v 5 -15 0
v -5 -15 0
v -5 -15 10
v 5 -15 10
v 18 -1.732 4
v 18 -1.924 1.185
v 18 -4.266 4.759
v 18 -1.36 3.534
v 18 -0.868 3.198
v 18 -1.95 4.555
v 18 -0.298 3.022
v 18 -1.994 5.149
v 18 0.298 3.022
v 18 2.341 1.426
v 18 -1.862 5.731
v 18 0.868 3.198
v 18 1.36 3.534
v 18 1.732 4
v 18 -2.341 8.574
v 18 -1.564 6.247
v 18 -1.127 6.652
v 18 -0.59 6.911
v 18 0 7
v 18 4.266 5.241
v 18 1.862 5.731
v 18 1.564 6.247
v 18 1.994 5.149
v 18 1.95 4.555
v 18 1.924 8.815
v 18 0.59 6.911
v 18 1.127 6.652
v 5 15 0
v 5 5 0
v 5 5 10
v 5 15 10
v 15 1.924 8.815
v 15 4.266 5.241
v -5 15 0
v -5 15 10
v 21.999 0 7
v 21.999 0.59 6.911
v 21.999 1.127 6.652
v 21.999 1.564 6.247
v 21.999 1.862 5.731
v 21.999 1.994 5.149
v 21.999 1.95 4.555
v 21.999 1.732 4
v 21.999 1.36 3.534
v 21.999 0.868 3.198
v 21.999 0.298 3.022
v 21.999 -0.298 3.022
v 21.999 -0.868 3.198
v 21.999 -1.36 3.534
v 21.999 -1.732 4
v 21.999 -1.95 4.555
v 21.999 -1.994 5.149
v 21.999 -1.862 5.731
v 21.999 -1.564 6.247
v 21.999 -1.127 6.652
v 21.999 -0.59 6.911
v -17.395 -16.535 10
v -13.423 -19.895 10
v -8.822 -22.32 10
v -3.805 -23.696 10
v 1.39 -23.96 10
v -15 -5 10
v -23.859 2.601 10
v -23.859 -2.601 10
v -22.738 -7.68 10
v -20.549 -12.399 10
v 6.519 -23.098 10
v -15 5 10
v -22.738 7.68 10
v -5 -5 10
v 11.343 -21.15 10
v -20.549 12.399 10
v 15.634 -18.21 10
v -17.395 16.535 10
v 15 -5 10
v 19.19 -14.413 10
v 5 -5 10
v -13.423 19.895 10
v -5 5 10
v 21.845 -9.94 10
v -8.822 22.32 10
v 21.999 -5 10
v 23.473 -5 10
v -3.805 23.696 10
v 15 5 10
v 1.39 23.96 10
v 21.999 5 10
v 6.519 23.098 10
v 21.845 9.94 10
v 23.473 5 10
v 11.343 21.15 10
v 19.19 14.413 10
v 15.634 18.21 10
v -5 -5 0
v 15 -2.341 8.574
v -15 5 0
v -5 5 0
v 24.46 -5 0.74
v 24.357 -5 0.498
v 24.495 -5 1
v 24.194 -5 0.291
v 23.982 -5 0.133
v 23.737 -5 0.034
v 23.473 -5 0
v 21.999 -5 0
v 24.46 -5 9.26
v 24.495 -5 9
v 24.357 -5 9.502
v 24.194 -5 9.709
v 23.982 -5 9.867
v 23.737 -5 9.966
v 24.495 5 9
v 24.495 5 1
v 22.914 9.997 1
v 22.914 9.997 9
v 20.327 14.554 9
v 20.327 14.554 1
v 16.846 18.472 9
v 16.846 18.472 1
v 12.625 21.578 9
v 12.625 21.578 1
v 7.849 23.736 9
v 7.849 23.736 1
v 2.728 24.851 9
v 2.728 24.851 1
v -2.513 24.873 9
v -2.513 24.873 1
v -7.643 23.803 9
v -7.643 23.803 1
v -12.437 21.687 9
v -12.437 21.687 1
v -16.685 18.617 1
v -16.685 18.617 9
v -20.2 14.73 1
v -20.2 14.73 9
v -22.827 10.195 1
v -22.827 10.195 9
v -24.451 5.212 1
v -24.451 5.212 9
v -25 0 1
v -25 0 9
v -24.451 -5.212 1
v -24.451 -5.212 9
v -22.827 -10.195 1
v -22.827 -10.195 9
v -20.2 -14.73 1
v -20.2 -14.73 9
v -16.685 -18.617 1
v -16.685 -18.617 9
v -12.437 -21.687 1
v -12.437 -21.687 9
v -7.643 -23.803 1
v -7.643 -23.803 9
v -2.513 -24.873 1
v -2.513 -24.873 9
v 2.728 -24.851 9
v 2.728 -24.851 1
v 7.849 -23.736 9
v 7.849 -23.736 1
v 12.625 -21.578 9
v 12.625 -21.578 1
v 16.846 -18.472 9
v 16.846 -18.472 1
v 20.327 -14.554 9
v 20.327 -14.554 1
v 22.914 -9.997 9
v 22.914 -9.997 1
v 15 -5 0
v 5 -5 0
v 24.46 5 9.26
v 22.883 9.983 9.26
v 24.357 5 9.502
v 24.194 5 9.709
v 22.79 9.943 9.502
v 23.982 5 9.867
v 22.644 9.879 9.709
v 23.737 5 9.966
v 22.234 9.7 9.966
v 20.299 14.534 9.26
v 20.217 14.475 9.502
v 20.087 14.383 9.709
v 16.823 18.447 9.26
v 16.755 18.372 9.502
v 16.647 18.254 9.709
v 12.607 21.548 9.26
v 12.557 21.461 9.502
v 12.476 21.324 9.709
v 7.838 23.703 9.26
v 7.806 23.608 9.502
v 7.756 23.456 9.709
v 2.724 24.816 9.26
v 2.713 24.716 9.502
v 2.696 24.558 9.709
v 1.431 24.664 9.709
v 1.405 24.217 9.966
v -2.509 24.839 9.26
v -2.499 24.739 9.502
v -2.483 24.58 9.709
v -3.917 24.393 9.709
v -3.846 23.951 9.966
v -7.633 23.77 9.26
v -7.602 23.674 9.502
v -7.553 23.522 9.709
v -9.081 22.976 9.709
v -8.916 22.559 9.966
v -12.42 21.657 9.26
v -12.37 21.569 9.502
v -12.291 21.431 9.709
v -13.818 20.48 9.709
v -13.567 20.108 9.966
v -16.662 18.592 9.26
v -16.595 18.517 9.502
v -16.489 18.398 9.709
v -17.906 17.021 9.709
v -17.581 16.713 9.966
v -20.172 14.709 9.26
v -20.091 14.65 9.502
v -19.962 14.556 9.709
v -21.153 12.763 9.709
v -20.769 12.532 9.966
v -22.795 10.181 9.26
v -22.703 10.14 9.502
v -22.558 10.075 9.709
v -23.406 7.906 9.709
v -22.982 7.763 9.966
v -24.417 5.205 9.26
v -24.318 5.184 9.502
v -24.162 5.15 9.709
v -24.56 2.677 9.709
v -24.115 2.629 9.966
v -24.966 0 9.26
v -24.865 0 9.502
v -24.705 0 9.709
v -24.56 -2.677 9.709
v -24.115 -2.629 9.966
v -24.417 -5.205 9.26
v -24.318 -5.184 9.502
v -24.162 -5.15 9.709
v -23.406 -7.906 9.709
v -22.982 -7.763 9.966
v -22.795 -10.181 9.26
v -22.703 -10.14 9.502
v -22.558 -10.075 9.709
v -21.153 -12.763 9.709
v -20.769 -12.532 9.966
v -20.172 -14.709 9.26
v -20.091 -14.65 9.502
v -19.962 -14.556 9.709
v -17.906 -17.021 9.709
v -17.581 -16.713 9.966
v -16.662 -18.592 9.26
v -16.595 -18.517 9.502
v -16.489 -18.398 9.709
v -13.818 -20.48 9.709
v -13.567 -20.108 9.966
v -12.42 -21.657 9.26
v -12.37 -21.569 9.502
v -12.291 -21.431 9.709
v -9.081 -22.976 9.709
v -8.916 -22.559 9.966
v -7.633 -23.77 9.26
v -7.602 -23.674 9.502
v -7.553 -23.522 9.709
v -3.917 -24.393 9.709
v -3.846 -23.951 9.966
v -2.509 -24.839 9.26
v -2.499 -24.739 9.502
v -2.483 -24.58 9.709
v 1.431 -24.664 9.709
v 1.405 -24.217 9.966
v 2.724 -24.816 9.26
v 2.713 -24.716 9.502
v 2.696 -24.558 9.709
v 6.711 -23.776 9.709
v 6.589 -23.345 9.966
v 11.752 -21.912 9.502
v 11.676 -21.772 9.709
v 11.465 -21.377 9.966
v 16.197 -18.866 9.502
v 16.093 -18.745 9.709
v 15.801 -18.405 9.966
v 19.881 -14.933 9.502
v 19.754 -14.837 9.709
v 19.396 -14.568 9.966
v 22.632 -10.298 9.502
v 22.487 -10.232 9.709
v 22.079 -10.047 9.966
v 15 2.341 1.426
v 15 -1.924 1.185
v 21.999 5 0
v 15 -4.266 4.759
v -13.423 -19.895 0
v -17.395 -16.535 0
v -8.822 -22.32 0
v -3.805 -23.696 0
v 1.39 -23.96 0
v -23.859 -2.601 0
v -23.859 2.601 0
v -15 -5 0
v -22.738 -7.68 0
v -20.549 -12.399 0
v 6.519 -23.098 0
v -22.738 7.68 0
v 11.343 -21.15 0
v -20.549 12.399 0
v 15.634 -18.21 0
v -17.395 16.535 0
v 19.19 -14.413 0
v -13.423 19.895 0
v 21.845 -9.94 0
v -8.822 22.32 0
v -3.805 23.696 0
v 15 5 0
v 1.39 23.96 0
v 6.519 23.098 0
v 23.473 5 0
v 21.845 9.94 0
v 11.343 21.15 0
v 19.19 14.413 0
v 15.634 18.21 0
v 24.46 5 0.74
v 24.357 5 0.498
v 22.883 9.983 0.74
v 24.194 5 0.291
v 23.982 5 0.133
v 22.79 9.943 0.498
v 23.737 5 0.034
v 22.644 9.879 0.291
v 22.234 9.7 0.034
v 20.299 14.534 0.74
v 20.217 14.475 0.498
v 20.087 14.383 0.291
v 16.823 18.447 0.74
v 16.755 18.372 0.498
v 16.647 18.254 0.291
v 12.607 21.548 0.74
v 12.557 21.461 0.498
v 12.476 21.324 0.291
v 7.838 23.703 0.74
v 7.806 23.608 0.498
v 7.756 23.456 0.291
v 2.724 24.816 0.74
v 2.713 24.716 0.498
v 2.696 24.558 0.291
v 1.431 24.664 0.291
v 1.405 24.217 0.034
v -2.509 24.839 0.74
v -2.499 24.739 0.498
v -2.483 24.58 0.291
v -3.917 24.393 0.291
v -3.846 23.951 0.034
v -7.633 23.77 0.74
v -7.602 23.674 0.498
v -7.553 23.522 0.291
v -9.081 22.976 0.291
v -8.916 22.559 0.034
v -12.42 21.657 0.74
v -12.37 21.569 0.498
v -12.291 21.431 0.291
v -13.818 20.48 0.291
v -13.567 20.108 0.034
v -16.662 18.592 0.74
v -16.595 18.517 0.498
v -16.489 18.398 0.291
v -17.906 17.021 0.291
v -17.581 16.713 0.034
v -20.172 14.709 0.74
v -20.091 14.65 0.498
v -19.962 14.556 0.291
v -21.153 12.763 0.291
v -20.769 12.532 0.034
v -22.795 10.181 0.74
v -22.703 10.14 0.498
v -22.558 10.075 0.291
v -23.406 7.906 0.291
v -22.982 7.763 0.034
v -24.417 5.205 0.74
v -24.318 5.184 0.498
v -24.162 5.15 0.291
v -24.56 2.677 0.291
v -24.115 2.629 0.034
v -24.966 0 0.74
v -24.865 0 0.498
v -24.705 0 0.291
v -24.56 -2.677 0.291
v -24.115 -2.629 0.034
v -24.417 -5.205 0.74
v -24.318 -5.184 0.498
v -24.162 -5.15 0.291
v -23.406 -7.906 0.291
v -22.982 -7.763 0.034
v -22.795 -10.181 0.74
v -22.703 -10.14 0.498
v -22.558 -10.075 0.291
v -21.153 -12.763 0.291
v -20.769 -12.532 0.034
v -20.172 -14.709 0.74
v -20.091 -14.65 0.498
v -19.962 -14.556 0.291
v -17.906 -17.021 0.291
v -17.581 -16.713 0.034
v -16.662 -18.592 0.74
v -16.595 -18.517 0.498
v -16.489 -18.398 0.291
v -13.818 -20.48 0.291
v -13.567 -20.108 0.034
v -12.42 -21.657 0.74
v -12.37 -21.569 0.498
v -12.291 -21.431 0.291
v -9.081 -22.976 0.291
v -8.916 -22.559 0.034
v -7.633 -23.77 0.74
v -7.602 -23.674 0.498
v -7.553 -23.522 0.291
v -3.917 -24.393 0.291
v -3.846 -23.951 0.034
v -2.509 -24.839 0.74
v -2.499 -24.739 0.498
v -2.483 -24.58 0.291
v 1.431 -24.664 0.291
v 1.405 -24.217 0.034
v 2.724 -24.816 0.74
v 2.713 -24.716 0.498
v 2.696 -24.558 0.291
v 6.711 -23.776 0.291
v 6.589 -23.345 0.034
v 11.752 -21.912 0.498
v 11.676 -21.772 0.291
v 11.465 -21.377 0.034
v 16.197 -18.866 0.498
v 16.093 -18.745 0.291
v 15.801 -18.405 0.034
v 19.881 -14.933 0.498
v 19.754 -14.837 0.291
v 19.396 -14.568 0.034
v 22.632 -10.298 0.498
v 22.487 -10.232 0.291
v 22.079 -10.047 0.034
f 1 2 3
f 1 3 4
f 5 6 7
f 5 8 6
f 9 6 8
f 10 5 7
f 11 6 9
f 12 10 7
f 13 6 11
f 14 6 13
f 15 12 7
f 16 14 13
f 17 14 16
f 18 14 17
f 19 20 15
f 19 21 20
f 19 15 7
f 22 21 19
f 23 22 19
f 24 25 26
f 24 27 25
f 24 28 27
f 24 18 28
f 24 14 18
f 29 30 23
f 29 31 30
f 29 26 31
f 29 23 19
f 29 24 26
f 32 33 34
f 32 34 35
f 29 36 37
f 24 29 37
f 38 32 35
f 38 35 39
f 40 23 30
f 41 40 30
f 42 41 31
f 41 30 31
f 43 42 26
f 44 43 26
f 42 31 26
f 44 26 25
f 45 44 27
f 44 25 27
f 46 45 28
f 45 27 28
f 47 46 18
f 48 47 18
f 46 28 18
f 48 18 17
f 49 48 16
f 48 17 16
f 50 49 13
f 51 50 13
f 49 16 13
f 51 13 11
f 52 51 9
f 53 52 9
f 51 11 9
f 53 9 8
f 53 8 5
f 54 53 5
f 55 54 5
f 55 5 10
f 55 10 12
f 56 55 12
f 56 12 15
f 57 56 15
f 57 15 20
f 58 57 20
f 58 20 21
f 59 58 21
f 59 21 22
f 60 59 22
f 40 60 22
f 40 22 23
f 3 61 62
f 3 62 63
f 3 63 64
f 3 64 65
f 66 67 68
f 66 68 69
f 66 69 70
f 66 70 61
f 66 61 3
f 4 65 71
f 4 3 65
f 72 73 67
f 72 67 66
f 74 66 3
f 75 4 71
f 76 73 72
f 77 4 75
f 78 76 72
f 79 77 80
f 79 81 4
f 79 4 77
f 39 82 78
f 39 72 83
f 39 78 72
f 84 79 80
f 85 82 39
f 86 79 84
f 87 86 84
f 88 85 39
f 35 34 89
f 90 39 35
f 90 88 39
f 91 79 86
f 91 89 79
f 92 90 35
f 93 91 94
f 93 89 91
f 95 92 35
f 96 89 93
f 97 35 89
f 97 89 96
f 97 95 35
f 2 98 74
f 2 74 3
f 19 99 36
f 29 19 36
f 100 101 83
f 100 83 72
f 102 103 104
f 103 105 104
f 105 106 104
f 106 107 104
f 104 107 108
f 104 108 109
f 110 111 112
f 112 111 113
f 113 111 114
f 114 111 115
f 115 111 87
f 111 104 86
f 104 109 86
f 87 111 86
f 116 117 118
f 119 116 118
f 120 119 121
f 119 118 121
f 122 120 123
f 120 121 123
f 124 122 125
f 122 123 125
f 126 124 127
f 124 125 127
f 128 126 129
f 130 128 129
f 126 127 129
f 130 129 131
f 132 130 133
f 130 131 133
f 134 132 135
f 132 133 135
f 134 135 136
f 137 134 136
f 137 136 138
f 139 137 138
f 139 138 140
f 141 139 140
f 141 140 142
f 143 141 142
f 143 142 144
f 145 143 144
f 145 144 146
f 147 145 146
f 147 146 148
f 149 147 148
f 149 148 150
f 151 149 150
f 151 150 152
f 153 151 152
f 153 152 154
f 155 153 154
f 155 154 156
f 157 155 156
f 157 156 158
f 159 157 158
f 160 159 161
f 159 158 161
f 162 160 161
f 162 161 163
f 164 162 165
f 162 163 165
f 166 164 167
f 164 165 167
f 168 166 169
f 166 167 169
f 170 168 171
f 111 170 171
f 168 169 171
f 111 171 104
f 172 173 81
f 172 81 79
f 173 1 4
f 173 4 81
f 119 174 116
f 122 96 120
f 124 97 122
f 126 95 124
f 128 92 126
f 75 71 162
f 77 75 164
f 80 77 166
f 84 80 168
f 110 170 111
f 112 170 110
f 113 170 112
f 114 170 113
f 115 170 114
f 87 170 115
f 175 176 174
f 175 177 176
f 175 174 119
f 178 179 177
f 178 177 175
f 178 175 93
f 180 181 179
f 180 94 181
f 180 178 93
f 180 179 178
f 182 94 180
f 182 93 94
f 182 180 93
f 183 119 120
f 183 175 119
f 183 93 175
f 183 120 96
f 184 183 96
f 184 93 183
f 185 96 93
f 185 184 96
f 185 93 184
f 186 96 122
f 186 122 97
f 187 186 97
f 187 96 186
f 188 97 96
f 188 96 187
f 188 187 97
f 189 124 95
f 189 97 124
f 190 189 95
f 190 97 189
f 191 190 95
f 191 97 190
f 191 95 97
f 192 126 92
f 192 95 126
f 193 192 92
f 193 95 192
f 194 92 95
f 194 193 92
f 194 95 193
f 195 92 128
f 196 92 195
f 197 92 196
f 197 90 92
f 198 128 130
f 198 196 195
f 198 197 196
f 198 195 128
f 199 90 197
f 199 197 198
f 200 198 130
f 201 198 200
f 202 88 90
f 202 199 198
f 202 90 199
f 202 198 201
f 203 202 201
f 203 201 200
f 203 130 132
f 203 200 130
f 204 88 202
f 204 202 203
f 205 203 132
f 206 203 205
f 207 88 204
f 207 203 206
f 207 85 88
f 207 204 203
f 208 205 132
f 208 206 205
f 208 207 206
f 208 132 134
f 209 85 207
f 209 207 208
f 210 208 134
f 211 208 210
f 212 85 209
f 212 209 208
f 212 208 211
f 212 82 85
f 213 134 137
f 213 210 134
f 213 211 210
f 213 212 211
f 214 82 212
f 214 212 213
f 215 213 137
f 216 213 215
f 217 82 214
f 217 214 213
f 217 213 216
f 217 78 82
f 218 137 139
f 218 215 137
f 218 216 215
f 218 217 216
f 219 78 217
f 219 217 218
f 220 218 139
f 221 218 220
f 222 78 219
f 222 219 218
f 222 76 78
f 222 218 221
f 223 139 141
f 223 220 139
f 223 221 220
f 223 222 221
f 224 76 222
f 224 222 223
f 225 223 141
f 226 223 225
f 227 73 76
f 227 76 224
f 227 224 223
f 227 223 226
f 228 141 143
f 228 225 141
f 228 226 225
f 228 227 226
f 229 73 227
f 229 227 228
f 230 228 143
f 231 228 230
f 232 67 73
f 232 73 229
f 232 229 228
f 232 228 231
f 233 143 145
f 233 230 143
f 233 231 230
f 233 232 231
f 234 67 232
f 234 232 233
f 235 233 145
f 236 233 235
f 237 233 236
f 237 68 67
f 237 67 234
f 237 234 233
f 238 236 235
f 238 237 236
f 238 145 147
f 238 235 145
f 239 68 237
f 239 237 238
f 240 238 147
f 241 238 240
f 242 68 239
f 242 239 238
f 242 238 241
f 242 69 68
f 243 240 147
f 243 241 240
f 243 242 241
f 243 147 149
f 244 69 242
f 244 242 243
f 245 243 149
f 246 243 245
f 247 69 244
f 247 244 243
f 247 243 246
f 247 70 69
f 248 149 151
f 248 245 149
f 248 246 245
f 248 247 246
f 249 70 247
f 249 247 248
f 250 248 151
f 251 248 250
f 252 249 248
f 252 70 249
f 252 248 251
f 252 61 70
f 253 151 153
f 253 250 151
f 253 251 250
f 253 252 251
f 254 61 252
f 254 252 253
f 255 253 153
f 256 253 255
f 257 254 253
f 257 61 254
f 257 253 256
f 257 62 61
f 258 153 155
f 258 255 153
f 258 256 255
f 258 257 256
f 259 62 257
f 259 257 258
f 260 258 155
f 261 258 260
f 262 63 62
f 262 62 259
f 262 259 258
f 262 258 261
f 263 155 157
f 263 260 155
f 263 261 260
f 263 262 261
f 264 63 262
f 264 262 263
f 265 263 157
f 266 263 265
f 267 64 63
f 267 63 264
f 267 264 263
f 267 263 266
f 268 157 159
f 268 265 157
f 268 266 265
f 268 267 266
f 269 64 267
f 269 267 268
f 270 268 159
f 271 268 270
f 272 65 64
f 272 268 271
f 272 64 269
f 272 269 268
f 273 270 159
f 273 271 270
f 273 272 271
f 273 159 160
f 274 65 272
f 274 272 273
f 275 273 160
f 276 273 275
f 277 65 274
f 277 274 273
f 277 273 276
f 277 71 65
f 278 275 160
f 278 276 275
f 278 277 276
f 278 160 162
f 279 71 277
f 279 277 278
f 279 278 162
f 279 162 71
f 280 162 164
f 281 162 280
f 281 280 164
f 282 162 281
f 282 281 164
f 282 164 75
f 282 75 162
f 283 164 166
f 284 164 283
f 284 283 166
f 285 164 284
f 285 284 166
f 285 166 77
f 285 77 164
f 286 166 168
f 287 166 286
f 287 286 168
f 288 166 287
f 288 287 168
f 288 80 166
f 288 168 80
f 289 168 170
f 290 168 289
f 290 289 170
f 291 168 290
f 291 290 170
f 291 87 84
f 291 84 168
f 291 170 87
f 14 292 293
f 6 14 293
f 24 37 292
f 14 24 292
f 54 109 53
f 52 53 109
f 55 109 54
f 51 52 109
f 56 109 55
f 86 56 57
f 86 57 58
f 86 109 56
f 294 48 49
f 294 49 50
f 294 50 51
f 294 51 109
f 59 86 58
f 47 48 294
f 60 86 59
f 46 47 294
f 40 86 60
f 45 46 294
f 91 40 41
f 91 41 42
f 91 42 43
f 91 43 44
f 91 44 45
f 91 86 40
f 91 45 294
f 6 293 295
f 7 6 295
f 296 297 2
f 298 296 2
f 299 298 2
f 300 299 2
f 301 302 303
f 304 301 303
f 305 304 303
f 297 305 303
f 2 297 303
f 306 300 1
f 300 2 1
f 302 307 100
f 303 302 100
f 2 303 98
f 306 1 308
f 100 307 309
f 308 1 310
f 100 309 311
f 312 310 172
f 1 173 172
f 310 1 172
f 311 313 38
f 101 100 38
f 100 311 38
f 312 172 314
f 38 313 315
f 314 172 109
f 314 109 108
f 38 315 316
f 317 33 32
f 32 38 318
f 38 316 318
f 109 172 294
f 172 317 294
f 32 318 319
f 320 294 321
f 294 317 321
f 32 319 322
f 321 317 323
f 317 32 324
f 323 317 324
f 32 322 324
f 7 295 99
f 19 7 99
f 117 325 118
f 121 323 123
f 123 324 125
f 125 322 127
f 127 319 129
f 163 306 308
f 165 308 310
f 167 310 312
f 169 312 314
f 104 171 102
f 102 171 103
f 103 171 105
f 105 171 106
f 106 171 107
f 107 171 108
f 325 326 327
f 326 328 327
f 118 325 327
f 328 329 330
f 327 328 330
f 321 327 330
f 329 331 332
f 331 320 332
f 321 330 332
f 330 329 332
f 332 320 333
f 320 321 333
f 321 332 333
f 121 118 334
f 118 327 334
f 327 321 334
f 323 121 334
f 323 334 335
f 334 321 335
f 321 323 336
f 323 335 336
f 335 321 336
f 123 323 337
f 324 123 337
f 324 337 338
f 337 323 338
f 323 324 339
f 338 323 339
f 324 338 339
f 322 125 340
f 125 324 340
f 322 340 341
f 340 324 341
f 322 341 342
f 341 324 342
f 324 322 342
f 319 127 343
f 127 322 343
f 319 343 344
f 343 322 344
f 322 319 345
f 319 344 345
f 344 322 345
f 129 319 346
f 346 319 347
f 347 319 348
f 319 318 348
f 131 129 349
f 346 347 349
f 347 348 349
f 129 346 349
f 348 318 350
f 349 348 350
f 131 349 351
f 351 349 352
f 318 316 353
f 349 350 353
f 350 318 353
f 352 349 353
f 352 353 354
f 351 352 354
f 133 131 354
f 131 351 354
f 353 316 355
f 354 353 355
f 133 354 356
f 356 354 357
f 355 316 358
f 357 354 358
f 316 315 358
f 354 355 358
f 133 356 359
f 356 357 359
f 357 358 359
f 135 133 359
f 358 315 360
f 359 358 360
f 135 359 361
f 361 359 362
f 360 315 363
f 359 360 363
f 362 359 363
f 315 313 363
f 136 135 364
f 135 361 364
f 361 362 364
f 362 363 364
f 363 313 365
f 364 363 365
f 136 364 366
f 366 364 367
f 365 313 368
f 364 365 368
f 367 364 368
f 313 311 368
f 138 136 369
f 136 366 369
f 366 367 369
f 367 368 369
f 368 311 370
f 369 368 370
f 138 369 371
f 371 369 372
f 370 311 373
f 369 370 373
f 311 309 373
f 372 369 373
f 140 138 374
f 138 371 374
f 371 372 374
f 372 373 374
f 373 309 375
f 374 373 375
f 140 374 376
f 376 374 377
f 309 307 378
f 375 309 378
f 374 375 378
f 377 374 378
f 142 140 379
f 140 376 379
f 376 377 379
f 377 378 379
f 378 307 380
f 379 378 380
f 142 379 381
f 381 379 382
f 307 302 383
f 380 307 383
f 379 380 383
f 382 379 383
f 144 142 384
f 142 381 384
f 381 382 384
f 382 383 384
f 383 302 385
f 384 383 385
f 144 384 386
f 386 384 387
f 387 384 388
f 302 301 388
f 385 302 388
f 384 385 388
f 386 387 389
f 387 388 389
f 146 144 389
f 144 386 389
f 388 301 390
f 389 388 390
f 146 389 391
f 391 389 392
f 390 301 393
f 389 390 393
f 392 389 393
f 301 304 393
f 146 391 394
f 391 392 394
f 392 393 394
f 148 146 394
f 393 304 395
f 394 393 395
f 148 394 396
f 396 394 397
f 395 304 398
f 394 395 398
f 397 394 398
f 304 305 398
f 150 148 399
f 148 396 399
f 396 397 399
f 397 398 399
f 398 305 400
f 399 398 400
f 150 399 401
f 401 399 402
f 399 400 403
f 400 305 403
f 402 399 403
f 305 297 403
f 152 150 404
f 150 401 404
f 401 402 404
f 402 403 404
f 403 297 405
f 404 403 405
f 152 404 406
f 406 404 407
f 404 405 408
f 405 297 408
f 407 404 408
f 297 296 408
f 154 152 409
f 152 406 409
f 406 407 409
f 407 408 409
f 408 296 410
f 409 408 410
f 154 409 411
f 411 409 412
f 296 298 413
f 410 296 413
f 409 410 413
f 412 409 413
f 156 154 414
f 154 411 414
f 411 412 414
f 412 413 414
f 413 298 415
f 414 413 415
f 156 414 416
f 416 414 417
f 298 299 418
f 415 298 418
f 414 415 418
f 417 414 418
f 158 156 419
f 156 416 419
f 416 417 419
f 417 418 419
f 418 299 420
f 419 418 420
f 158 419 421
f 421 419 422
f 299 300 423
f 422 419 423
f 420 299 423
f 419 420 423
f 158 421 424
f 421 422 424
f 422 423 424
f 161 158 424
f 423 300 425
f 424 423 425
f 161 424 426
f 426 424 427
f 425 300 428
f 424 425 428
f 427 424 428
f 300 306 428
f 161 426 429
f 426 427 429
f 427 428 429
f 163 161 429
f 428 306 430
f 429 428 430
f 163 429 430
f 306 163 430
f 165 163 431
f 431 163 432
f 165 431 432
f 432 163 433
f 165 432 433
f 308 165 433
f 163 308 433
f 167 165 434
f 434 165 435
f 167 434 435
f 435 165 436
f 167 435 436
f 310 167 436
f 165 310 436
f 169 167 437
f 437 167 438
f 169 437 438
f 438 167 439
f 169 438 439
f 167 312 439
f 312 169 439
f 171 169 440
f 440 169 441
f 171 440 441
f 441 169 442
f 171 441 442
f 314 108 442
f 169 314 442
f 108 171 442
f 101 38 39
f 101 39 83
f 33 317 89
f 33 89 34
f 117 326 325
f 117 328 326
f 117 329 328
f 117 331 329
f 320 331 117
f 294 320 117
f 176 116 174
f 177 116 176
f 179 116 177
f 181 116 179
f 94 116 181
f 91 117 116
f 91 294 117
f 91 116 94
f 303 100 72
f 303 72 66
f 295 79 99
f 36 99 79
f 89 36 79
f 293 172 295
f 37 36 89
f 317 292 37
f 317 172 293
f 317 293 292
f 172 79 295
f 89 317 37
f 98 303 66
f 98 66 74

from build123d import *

# Parameters (mm, degrees)
SKETCH1_R               = 25
BOSS_EXTRUDE1_DEPTH     = 10
CUT_EXTRUDE1_DEPTH      = 37.742346142
CUT_EXTRUDE1_DEPTH_BACK = 37.742346142
CUT_EXTRUDE2_DEPTH      = 3
SKETCH5_R               = 2
CUT_EXTRUDE4_DEPTH      = 13
FILLET1_R               = 1
CUT_EXTRUDE6_DEPTH      = 3
CUT_EXTRUDE6_DEPTH_BACK = 3
SKETCH6_W               = 10
SKETCH6_H               = 10


with BuildPart() as part:
    # Sketch1 → Boss-Extrude1 (new body)
    with BuildSketch(Plane.XY):
        Circle(SKETCH1_R)
    extrude(amount=BOSS_EXTRUDE1_DEPTH)

    # Sketch2 → Cut-Extrude1 (cut, two sides: drawn at the far end of the back side and taken through both)
    with BuildSketch(Plane.XY.offset(10).offset(-CUT_EXTRUDE1_DEPTH_BACK)):
        Polygon((5, -5), (15, -5), (15, 5), (5, 5), (5, 15), (-5, 15), (-5, 5), (-15, 5), (-15, -5), (-5, -5), (-5, -15), (5, -15), align=None)
    extrude(amount=CUT_EXTRUDE1_DEPTH + CUT_EXTRUDE1_DEPTH_BACK, mode=Mode.SUBTRACT)

    # Sketch4 → Cut-Extrude2 (cut)
    with BuildSketch(Plane.ZY.offset(-15)):
        Polygon((4.759098318, -4.265594884), (8.57366269, -2.341424419), (8.814564373, 1.924170465), (5.240901682, 4.265594884), (1.42633731, 2.341424419), (1.185435627, -1.924170465), align=None)
    extrude(amount=-CUT_EXTRUDE2_DEPTH, mode=Mode.SUBTRACT)

    # Sketch5 → Cut-Extrude4 (cut)
    with BuildSketch(Plane.ZY.offset(-18)):
        with Locations((5, 0)):
            Circle(SKETCH5_R)
    extrude(amount=-CUT_EXTRUDE4_DEPTH, mode=Mode.SUBTRACT)

    # Fillet1
    fillet1_edges = [part.edges().sort_by_distance(p)[0] for p in [
        (-25, 0, 0),
        (-25, 0, 10),
    ]]
    fillet(fillet1_edges, radius=FILLET1_R)

    # Sketch6 → Cut-Extrude6 (cut, two sides: drawn at the far end of the back side and taken through both)
    with BuildSketch(Plane.YZ.offset(24.999151456).offset(-CUT_EXTRUDE6_DEPTH_BACK)):
        with Locations((0, 5)):
            Rectangle(SKETCH6_W, SKETCH6_H)
    extrude(amount=CUT_EXTRUDE6_DEPTH + CUT_EXTRUDE6_DEPTH_BACK, mode=Mode.SUBTRACT)


solid = part.part
